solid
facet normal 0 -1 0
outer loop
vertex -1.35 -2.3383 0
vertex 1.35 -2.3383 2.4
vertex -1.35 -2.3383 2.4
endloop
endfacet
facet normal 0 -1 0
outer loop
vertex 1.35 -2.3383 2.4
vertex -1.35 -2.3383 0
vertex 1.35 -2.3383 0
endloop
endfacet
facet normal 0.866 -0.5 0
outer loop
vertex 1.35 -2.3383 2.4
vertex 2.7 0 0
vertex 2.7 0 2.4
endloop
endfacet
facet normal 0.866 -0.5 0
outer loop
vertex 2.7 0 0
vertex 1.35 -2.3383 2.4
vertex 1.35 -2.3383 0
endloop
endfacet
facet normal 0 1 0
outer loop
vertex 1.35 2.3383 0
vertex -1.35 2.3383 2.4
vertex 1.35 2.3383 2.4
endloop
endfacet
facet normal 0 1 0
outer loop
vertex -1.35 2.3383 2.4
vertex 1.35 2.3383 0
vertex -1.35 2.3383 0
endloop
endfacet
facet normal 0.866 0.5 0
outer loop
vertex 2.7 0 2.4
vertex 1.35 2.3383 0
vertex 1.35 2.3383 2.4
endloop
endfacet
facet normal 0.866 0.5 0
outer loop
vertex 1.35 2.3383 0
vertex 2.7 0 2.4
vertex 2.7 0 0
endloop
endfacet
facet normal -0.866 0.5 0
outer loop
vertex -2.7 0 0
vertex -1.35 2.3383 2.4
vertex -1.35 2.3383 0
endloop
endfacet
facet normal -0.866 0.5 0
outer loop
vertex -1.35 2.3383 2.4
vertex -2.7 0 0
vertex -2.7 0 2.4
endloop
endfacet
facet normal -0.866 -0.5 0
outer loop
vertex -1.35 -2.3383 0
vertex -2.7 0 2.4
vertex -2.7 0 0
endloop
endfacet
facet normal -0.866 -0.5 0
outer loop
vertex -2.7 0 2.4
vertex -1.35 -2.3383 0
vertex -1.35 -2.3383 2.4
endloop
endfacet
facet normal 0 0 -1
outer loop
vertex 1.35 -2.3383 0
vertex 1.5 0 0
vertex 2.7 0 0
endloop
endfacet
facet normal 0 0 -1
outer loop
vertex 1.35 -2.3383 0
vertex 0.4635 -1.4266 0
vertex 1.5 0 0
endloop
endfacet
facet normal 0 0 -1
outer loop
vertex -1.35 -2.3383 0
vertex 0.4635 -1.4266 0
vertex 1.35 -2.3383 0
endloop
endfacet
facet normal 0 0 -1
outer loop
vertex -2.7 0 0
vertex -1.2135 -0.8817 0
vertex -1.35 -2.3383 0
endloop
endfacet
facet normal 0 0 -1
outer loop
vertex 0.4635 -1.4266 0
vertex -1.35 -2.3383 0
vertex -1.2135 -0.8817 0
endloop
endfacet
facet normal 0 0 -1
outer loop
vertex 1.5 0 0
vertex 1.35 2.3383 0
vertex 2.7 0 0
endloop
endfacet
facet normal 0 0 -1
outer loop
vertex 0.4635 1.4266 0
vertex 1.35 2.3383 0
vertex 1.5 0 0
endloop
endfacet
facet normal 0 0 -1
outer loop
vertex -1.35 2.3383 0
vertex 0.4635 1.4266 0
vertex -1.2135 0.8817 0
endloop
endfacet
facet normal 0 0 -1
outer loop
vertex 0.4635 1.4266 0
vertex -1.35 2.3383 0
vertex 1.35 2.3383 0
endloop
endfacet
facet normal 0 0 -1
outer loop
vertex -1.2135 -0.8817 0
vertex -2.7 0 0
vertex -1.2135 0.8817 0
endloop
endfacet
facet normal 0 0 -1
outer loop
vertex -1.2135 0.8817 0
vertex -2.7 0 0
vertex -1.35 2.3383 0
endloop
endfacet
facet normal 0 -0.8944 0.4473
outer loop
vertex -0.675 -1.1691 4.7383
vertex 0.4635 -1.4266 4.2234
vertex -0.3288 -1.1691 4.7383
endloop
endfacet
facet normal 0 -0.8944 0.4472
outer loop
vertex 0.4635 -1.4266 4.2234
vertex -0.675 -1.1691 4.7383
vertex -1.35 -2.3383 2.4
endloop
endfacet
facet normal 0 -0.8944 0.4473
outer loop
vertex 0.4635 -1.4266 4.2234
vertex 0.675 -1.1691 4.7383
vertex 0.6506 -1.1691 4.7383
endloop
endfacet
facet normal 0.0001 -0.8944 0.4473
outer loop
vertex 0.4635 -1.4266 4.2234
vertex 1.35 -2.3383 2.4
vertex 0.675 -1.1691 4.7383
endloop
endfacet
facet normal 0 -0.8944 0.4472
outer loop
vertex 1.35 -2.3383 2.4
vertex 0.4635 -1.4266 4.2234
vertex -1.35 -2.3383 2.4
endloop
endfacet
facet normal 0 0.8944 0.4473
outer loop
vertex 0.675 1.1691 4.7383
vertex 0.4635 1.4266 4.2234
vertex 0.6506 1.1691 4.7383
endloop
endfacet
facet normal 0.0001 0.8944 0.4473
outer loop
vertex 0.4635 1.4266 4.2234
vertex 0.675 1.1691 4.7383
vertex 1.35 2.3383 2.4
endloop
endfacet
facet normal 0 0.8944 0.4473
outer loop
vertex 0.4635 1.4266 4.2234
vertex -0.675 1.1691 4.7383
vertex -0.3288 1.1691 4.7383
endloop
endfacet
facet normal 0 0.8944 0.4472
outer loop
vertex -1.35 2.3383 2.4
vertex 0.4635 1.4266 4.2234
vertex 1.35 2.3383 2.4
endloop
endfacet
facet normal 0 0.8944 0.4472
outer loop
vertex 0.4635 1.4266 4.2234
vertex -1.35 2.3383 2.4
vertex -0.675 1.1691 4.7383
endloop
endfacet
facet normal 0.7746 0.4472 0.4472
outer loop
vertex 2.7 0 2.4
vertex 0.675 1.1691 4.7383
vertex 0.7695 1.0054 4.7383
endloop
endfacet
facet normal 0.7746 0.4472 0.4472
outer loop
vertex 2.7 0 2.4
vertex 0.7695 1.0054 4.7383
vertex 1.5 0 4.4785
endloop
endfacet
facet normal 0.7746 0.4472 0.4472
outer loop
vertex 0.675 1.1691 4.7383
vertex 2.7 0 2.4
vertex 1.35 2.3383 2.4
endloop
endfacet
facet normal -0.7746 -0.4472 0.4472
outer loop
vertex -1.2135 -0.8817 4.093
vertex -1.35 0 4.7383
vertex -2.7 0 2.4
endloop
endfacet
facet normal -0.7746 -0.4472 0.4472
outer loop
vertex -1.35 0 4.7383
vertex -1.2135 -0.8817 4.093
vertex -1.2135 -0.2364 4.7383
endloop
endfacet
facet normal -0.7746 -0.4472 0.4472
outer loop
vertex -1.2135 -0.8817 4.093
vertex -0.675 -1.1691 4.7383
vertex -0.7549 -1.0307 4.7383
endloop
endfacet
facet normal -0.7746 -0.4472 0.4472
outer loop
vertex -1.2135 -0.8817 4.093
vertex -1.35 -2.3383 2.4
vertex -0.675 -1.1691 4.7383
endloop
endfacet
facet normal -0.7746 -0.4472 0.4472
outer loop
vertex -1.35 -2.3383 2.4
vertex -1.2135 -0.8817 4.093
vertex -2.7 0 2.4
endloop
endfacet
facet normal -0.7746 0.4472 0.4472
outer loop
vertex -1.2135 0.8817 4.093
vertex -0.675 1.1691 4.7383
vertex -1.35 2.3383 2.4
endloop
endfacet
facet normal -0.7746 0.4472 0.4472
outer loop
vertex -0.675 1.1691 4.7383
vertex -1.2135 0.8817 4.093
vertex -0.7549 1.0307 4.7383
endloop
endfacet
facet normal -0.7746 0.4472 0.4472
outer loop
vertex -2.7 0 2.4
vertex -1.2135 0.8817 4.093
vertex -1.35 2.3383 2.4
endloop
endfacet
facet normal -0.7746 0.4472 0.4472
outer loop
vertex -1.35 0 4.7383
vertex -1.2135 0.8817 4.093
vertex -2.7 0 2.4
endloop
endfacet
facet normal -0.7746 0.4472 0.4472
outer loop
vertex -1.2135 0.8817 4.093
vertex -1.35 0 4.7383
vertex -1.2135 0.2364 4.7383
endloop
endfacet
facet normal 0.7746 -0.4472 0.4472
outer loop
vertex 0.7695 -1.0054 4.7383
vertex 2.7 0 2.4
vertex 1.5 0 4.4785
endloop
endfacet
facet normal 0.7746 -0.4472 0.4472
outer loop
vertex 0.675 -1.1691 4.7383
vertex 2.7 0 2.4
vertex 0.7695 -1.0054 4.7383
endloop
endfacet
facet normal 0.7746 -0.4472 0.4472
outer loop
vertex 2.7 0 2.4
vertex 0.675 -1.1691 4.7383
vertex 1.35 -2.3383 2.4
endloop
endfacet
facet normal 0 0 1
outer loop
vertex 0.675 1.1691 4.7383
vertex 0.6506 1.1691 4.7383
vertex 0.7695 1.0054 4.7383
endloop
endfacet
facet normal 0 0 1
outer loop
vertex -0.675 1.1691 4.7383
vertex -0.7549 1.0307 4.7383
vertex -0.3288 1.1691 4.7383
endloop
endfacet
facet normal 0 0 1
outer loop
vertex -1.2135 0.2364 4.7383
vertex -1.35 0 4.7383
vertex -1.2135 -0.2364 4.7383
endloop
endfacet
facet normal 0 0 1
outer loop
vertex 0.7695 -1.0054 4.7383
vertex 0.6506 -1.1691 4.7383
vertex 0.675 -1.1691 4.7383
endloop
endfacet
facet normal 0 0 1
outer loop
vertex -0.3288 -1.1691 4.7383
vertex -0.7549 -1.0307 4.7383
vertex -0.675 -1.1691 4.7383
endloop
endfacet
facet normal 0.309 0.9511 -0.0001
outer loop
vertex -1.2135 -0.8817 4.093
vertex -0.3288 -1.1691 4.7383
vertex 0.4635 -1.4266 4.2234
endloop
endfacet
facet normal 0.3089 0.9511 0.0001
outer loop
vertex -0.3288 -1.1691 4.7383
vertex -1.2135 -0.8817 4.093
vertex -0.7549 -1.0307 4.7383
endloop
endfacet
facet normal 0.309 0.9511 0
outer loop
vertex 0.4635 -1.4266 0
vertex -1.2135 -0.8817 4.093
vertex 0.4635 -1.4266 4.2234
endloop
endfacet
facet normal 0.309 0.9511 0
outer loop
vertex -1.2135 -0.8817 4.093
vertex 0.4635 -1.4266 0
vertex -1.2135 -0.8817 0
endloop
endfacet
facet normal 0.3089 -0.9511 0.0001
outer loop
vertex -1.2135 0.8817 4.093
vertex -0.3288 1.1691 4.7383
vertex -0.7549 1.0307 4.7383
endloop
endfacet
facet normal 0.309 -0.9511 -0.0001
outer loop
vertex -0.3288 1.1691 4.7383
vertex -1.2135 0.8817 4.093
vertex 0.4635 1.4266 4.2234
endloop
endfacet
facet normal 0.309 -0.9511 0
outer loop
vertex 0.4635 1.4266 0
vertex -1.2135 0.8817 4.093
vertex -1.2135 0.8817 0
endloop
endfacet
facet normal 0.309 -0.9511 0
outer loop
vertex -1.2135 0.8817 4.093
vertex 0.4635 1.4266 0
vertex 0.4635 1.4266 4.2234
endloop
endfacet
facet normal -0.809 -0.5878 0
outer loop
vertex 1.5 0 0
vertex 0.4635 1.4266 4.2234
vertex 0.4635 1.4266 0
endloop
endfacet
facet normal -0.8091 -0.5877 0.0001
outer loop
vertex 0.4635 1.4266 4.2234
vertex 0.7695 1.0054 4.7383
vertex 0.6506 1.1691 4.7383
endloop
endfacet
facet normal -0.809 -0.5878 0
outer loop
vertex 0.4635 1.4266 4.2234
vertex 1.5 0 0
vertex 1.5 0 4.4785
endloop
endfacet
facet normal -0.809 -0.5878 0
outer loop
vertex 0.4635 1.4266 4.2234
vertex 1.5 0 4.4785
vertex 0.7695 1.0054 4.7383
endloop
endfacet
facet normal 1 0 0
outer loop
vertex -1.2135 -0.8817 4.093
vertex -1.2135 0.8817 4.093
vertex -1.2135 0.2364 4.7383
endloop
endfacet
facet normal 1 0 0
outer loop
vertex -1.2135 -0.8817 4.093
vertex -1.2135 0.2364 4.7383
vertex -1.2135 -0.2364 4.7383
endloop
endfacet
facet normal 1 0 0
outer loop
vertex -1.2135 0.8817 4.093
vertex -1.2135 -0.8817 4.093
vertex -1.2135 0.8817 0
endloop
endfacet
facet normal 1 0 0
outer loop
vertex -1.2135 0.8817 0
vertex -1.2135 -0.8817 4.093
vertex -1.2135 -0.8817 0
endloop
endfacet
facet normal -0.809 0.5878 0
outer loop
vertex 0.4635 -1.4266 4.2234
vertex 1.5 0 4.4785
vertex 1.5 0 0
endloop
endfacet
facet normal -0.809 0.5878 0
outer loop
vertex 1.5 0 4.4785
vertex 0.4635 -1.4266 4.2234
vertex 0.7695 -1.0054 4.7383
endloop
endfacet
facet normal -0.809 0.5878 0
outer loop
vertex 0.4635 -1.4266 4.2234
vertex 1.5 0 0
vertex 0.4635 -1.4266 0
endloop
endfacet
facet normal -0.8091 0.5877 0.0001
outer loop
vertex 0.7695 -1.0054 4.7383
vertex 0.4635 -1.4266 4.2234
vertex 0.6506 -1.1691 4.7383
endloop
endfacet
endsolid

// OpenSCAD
// file: ../machine.scad
/*
 * Helpers for machinging; i.e. kerf alowances
 *
 * Copyright 2013 <b@Zi.iS>
 * License CC BY 3.0
 */

ZCUT = 0;
XOFF = 0;
YOFF = 0;

module drawing() {
	//create blueprint
	if(preview==0) {
		projection(cut=true) translate([
			XOFF,
			YOFF,
			ZCUT
		]) {
            if($children) children([0:$children-1]);
		}
	} else {
        if($children) children([0:$children-1]);
	}
}

module kerf_cube(
	size
) {
	translate([
		kerf/2*(1-preview),
		kerf/2*(1-preview),
		0
	]) {
		cube([
			size[0] - kerf*(1-preview),
			size[1] - kerf*(1-preview),
			size[2]
		]);
	}
}

module kerf_cylinder(
	r,
	h
) {
	cylinder(
		r = r - kerf/2*(1-preview),
		h = h
	);
}

module part(
	id,
	name
) {
	if(PART<1 || PART==id || id<0) {
		if(id>=0) echo(str("PART", id, ":", name));
        if($children) children([0:$children-1]);
	}	
}
// file: ../easing.scad
/*
 * Make allowances to ensure good fit.
 *
 * Copyright 2013 <b@Zi.iS>
 * License CC BY 3.0
 */

function ease(value) = min(value*1.1, value + .2);
// file: ../epslion.scad
/*
 * Slightly offset previews to overcome rounding issues
 *
 * Copyright 2013 <b@Zi.iS>
 * License CC BY 3.0
 */

include <config.scad>;

module e(
	shift = -.1,
	size = 1.1
) {
	if(preview == 1) {
		translate([
			0,
			0,
			shift
		]) {
			scale([
				1,
				1,
				size
			]) {
                if($children) children([0:$children-1]);
			}
		}
	} else {
        if($children) children([0:$children-1]);
	}
}

function space(pitch, i) = -pitch/2 + pitch*i;
// file: ../config.scad
/*
 * Default settings
 *
 * Copyright 2013 <b@Zi.iS>
 * License CC BY 3.0
 */

preview = 1;
$fa = 6;
$fs = 2 - 1.5*(1-preview);
kerf = .3;
PART = 0; //all

// preview colors
color_steel = [.8, .8, .8];
color_wood = [.3, .3, 0];
color_print = [0, .8, 0];
color_plastic = [.7, 1, .7];
color_brass = [181/255, 166/255, 66/255];
color_acrylic = [.9,.9,.9,.5];
// file: ../main.scad
/*
 * A library to make SCAD easier.
 *
 * Copyright 2013 <b@Zi.iS>
 * License CC BY 3.0
 */

include <config.scad>;
use <epslion.scad>;
use <easing.scad>;
include <machine.scad>;
// main file
/*
 * Metric hardware
 *
 * Copyright 2013 <b@Zi.iS>
 * License CC BY 3.0
 */

include <../main.scad>;

function m_washer_width(size) = size*.2;
function m_nut_width(size) = size*.8;
function m_nut_r(size) = size*1.8/2;

m_tap = [
    0,
    1.6,
    2.5,
    3.3,
    4.2,
    5,
    6.8,
    8.5,
    10.2
];

module m_washer(
	size = 3,
	id,
    fraction = 1
) {
	part(id, str("Washer M", size)) color(color_steel) {
		difference() {
			cylinder(
				r = size/2*2,
				h = size*.2 / fraction
			);
			e() cylinder(
				r = size/2,
				h = size*.2 / fraction
			);
		}
	}
	translate([
		0,
		0,
		size*.2 / fraction
	] * preview) {
		if($children>0) for (i = [0 : $children-1]) child(i);
	}
}

module m_nut(
	size = 3,
	id
) {
	part(id, str("Nut M", size)) color(color_steel) {
		difference() {
			cylinder(
				r = size*1.8/2,
				h = size*.8,
				$fn = 6
			);
			e() cylinder(
				r = size/2,
				h = size*.8
			);
		}
	}
	translate([
		0,
		0,
		size*.8
	] * preview) {
		if($children>0) for (i = [0 : $children-1]) child(i);
	}
}

m_nylock();

module m_nylock(
	size = 3,
	id
) {
	part(id, str("Nylock M", size)) color(color_steel) {
		difference() {
			union() {
				cylinder(
					r = size*1.8/2,
					h = size*0.8,
					$fn = 6
				);
				translate([
					0,
					0,
					size*0.8
				]) {
					sphere(
						r = size*1.8/2,
						$fn = 6
					);
				}
			}
			e() cylinder(
				r = size/2,
				h = size*1.5
			);
		}
	}
	translate([
		0,
		0,
		size
	]) {
		if($children>0) for (i = [0 : $children-1]) child(i);
	}
}

module m_tap(
    rod,
    h
) {
    kerf_cylinder(
        r = m_tap[rod]/2,
        h = h
    );
}
